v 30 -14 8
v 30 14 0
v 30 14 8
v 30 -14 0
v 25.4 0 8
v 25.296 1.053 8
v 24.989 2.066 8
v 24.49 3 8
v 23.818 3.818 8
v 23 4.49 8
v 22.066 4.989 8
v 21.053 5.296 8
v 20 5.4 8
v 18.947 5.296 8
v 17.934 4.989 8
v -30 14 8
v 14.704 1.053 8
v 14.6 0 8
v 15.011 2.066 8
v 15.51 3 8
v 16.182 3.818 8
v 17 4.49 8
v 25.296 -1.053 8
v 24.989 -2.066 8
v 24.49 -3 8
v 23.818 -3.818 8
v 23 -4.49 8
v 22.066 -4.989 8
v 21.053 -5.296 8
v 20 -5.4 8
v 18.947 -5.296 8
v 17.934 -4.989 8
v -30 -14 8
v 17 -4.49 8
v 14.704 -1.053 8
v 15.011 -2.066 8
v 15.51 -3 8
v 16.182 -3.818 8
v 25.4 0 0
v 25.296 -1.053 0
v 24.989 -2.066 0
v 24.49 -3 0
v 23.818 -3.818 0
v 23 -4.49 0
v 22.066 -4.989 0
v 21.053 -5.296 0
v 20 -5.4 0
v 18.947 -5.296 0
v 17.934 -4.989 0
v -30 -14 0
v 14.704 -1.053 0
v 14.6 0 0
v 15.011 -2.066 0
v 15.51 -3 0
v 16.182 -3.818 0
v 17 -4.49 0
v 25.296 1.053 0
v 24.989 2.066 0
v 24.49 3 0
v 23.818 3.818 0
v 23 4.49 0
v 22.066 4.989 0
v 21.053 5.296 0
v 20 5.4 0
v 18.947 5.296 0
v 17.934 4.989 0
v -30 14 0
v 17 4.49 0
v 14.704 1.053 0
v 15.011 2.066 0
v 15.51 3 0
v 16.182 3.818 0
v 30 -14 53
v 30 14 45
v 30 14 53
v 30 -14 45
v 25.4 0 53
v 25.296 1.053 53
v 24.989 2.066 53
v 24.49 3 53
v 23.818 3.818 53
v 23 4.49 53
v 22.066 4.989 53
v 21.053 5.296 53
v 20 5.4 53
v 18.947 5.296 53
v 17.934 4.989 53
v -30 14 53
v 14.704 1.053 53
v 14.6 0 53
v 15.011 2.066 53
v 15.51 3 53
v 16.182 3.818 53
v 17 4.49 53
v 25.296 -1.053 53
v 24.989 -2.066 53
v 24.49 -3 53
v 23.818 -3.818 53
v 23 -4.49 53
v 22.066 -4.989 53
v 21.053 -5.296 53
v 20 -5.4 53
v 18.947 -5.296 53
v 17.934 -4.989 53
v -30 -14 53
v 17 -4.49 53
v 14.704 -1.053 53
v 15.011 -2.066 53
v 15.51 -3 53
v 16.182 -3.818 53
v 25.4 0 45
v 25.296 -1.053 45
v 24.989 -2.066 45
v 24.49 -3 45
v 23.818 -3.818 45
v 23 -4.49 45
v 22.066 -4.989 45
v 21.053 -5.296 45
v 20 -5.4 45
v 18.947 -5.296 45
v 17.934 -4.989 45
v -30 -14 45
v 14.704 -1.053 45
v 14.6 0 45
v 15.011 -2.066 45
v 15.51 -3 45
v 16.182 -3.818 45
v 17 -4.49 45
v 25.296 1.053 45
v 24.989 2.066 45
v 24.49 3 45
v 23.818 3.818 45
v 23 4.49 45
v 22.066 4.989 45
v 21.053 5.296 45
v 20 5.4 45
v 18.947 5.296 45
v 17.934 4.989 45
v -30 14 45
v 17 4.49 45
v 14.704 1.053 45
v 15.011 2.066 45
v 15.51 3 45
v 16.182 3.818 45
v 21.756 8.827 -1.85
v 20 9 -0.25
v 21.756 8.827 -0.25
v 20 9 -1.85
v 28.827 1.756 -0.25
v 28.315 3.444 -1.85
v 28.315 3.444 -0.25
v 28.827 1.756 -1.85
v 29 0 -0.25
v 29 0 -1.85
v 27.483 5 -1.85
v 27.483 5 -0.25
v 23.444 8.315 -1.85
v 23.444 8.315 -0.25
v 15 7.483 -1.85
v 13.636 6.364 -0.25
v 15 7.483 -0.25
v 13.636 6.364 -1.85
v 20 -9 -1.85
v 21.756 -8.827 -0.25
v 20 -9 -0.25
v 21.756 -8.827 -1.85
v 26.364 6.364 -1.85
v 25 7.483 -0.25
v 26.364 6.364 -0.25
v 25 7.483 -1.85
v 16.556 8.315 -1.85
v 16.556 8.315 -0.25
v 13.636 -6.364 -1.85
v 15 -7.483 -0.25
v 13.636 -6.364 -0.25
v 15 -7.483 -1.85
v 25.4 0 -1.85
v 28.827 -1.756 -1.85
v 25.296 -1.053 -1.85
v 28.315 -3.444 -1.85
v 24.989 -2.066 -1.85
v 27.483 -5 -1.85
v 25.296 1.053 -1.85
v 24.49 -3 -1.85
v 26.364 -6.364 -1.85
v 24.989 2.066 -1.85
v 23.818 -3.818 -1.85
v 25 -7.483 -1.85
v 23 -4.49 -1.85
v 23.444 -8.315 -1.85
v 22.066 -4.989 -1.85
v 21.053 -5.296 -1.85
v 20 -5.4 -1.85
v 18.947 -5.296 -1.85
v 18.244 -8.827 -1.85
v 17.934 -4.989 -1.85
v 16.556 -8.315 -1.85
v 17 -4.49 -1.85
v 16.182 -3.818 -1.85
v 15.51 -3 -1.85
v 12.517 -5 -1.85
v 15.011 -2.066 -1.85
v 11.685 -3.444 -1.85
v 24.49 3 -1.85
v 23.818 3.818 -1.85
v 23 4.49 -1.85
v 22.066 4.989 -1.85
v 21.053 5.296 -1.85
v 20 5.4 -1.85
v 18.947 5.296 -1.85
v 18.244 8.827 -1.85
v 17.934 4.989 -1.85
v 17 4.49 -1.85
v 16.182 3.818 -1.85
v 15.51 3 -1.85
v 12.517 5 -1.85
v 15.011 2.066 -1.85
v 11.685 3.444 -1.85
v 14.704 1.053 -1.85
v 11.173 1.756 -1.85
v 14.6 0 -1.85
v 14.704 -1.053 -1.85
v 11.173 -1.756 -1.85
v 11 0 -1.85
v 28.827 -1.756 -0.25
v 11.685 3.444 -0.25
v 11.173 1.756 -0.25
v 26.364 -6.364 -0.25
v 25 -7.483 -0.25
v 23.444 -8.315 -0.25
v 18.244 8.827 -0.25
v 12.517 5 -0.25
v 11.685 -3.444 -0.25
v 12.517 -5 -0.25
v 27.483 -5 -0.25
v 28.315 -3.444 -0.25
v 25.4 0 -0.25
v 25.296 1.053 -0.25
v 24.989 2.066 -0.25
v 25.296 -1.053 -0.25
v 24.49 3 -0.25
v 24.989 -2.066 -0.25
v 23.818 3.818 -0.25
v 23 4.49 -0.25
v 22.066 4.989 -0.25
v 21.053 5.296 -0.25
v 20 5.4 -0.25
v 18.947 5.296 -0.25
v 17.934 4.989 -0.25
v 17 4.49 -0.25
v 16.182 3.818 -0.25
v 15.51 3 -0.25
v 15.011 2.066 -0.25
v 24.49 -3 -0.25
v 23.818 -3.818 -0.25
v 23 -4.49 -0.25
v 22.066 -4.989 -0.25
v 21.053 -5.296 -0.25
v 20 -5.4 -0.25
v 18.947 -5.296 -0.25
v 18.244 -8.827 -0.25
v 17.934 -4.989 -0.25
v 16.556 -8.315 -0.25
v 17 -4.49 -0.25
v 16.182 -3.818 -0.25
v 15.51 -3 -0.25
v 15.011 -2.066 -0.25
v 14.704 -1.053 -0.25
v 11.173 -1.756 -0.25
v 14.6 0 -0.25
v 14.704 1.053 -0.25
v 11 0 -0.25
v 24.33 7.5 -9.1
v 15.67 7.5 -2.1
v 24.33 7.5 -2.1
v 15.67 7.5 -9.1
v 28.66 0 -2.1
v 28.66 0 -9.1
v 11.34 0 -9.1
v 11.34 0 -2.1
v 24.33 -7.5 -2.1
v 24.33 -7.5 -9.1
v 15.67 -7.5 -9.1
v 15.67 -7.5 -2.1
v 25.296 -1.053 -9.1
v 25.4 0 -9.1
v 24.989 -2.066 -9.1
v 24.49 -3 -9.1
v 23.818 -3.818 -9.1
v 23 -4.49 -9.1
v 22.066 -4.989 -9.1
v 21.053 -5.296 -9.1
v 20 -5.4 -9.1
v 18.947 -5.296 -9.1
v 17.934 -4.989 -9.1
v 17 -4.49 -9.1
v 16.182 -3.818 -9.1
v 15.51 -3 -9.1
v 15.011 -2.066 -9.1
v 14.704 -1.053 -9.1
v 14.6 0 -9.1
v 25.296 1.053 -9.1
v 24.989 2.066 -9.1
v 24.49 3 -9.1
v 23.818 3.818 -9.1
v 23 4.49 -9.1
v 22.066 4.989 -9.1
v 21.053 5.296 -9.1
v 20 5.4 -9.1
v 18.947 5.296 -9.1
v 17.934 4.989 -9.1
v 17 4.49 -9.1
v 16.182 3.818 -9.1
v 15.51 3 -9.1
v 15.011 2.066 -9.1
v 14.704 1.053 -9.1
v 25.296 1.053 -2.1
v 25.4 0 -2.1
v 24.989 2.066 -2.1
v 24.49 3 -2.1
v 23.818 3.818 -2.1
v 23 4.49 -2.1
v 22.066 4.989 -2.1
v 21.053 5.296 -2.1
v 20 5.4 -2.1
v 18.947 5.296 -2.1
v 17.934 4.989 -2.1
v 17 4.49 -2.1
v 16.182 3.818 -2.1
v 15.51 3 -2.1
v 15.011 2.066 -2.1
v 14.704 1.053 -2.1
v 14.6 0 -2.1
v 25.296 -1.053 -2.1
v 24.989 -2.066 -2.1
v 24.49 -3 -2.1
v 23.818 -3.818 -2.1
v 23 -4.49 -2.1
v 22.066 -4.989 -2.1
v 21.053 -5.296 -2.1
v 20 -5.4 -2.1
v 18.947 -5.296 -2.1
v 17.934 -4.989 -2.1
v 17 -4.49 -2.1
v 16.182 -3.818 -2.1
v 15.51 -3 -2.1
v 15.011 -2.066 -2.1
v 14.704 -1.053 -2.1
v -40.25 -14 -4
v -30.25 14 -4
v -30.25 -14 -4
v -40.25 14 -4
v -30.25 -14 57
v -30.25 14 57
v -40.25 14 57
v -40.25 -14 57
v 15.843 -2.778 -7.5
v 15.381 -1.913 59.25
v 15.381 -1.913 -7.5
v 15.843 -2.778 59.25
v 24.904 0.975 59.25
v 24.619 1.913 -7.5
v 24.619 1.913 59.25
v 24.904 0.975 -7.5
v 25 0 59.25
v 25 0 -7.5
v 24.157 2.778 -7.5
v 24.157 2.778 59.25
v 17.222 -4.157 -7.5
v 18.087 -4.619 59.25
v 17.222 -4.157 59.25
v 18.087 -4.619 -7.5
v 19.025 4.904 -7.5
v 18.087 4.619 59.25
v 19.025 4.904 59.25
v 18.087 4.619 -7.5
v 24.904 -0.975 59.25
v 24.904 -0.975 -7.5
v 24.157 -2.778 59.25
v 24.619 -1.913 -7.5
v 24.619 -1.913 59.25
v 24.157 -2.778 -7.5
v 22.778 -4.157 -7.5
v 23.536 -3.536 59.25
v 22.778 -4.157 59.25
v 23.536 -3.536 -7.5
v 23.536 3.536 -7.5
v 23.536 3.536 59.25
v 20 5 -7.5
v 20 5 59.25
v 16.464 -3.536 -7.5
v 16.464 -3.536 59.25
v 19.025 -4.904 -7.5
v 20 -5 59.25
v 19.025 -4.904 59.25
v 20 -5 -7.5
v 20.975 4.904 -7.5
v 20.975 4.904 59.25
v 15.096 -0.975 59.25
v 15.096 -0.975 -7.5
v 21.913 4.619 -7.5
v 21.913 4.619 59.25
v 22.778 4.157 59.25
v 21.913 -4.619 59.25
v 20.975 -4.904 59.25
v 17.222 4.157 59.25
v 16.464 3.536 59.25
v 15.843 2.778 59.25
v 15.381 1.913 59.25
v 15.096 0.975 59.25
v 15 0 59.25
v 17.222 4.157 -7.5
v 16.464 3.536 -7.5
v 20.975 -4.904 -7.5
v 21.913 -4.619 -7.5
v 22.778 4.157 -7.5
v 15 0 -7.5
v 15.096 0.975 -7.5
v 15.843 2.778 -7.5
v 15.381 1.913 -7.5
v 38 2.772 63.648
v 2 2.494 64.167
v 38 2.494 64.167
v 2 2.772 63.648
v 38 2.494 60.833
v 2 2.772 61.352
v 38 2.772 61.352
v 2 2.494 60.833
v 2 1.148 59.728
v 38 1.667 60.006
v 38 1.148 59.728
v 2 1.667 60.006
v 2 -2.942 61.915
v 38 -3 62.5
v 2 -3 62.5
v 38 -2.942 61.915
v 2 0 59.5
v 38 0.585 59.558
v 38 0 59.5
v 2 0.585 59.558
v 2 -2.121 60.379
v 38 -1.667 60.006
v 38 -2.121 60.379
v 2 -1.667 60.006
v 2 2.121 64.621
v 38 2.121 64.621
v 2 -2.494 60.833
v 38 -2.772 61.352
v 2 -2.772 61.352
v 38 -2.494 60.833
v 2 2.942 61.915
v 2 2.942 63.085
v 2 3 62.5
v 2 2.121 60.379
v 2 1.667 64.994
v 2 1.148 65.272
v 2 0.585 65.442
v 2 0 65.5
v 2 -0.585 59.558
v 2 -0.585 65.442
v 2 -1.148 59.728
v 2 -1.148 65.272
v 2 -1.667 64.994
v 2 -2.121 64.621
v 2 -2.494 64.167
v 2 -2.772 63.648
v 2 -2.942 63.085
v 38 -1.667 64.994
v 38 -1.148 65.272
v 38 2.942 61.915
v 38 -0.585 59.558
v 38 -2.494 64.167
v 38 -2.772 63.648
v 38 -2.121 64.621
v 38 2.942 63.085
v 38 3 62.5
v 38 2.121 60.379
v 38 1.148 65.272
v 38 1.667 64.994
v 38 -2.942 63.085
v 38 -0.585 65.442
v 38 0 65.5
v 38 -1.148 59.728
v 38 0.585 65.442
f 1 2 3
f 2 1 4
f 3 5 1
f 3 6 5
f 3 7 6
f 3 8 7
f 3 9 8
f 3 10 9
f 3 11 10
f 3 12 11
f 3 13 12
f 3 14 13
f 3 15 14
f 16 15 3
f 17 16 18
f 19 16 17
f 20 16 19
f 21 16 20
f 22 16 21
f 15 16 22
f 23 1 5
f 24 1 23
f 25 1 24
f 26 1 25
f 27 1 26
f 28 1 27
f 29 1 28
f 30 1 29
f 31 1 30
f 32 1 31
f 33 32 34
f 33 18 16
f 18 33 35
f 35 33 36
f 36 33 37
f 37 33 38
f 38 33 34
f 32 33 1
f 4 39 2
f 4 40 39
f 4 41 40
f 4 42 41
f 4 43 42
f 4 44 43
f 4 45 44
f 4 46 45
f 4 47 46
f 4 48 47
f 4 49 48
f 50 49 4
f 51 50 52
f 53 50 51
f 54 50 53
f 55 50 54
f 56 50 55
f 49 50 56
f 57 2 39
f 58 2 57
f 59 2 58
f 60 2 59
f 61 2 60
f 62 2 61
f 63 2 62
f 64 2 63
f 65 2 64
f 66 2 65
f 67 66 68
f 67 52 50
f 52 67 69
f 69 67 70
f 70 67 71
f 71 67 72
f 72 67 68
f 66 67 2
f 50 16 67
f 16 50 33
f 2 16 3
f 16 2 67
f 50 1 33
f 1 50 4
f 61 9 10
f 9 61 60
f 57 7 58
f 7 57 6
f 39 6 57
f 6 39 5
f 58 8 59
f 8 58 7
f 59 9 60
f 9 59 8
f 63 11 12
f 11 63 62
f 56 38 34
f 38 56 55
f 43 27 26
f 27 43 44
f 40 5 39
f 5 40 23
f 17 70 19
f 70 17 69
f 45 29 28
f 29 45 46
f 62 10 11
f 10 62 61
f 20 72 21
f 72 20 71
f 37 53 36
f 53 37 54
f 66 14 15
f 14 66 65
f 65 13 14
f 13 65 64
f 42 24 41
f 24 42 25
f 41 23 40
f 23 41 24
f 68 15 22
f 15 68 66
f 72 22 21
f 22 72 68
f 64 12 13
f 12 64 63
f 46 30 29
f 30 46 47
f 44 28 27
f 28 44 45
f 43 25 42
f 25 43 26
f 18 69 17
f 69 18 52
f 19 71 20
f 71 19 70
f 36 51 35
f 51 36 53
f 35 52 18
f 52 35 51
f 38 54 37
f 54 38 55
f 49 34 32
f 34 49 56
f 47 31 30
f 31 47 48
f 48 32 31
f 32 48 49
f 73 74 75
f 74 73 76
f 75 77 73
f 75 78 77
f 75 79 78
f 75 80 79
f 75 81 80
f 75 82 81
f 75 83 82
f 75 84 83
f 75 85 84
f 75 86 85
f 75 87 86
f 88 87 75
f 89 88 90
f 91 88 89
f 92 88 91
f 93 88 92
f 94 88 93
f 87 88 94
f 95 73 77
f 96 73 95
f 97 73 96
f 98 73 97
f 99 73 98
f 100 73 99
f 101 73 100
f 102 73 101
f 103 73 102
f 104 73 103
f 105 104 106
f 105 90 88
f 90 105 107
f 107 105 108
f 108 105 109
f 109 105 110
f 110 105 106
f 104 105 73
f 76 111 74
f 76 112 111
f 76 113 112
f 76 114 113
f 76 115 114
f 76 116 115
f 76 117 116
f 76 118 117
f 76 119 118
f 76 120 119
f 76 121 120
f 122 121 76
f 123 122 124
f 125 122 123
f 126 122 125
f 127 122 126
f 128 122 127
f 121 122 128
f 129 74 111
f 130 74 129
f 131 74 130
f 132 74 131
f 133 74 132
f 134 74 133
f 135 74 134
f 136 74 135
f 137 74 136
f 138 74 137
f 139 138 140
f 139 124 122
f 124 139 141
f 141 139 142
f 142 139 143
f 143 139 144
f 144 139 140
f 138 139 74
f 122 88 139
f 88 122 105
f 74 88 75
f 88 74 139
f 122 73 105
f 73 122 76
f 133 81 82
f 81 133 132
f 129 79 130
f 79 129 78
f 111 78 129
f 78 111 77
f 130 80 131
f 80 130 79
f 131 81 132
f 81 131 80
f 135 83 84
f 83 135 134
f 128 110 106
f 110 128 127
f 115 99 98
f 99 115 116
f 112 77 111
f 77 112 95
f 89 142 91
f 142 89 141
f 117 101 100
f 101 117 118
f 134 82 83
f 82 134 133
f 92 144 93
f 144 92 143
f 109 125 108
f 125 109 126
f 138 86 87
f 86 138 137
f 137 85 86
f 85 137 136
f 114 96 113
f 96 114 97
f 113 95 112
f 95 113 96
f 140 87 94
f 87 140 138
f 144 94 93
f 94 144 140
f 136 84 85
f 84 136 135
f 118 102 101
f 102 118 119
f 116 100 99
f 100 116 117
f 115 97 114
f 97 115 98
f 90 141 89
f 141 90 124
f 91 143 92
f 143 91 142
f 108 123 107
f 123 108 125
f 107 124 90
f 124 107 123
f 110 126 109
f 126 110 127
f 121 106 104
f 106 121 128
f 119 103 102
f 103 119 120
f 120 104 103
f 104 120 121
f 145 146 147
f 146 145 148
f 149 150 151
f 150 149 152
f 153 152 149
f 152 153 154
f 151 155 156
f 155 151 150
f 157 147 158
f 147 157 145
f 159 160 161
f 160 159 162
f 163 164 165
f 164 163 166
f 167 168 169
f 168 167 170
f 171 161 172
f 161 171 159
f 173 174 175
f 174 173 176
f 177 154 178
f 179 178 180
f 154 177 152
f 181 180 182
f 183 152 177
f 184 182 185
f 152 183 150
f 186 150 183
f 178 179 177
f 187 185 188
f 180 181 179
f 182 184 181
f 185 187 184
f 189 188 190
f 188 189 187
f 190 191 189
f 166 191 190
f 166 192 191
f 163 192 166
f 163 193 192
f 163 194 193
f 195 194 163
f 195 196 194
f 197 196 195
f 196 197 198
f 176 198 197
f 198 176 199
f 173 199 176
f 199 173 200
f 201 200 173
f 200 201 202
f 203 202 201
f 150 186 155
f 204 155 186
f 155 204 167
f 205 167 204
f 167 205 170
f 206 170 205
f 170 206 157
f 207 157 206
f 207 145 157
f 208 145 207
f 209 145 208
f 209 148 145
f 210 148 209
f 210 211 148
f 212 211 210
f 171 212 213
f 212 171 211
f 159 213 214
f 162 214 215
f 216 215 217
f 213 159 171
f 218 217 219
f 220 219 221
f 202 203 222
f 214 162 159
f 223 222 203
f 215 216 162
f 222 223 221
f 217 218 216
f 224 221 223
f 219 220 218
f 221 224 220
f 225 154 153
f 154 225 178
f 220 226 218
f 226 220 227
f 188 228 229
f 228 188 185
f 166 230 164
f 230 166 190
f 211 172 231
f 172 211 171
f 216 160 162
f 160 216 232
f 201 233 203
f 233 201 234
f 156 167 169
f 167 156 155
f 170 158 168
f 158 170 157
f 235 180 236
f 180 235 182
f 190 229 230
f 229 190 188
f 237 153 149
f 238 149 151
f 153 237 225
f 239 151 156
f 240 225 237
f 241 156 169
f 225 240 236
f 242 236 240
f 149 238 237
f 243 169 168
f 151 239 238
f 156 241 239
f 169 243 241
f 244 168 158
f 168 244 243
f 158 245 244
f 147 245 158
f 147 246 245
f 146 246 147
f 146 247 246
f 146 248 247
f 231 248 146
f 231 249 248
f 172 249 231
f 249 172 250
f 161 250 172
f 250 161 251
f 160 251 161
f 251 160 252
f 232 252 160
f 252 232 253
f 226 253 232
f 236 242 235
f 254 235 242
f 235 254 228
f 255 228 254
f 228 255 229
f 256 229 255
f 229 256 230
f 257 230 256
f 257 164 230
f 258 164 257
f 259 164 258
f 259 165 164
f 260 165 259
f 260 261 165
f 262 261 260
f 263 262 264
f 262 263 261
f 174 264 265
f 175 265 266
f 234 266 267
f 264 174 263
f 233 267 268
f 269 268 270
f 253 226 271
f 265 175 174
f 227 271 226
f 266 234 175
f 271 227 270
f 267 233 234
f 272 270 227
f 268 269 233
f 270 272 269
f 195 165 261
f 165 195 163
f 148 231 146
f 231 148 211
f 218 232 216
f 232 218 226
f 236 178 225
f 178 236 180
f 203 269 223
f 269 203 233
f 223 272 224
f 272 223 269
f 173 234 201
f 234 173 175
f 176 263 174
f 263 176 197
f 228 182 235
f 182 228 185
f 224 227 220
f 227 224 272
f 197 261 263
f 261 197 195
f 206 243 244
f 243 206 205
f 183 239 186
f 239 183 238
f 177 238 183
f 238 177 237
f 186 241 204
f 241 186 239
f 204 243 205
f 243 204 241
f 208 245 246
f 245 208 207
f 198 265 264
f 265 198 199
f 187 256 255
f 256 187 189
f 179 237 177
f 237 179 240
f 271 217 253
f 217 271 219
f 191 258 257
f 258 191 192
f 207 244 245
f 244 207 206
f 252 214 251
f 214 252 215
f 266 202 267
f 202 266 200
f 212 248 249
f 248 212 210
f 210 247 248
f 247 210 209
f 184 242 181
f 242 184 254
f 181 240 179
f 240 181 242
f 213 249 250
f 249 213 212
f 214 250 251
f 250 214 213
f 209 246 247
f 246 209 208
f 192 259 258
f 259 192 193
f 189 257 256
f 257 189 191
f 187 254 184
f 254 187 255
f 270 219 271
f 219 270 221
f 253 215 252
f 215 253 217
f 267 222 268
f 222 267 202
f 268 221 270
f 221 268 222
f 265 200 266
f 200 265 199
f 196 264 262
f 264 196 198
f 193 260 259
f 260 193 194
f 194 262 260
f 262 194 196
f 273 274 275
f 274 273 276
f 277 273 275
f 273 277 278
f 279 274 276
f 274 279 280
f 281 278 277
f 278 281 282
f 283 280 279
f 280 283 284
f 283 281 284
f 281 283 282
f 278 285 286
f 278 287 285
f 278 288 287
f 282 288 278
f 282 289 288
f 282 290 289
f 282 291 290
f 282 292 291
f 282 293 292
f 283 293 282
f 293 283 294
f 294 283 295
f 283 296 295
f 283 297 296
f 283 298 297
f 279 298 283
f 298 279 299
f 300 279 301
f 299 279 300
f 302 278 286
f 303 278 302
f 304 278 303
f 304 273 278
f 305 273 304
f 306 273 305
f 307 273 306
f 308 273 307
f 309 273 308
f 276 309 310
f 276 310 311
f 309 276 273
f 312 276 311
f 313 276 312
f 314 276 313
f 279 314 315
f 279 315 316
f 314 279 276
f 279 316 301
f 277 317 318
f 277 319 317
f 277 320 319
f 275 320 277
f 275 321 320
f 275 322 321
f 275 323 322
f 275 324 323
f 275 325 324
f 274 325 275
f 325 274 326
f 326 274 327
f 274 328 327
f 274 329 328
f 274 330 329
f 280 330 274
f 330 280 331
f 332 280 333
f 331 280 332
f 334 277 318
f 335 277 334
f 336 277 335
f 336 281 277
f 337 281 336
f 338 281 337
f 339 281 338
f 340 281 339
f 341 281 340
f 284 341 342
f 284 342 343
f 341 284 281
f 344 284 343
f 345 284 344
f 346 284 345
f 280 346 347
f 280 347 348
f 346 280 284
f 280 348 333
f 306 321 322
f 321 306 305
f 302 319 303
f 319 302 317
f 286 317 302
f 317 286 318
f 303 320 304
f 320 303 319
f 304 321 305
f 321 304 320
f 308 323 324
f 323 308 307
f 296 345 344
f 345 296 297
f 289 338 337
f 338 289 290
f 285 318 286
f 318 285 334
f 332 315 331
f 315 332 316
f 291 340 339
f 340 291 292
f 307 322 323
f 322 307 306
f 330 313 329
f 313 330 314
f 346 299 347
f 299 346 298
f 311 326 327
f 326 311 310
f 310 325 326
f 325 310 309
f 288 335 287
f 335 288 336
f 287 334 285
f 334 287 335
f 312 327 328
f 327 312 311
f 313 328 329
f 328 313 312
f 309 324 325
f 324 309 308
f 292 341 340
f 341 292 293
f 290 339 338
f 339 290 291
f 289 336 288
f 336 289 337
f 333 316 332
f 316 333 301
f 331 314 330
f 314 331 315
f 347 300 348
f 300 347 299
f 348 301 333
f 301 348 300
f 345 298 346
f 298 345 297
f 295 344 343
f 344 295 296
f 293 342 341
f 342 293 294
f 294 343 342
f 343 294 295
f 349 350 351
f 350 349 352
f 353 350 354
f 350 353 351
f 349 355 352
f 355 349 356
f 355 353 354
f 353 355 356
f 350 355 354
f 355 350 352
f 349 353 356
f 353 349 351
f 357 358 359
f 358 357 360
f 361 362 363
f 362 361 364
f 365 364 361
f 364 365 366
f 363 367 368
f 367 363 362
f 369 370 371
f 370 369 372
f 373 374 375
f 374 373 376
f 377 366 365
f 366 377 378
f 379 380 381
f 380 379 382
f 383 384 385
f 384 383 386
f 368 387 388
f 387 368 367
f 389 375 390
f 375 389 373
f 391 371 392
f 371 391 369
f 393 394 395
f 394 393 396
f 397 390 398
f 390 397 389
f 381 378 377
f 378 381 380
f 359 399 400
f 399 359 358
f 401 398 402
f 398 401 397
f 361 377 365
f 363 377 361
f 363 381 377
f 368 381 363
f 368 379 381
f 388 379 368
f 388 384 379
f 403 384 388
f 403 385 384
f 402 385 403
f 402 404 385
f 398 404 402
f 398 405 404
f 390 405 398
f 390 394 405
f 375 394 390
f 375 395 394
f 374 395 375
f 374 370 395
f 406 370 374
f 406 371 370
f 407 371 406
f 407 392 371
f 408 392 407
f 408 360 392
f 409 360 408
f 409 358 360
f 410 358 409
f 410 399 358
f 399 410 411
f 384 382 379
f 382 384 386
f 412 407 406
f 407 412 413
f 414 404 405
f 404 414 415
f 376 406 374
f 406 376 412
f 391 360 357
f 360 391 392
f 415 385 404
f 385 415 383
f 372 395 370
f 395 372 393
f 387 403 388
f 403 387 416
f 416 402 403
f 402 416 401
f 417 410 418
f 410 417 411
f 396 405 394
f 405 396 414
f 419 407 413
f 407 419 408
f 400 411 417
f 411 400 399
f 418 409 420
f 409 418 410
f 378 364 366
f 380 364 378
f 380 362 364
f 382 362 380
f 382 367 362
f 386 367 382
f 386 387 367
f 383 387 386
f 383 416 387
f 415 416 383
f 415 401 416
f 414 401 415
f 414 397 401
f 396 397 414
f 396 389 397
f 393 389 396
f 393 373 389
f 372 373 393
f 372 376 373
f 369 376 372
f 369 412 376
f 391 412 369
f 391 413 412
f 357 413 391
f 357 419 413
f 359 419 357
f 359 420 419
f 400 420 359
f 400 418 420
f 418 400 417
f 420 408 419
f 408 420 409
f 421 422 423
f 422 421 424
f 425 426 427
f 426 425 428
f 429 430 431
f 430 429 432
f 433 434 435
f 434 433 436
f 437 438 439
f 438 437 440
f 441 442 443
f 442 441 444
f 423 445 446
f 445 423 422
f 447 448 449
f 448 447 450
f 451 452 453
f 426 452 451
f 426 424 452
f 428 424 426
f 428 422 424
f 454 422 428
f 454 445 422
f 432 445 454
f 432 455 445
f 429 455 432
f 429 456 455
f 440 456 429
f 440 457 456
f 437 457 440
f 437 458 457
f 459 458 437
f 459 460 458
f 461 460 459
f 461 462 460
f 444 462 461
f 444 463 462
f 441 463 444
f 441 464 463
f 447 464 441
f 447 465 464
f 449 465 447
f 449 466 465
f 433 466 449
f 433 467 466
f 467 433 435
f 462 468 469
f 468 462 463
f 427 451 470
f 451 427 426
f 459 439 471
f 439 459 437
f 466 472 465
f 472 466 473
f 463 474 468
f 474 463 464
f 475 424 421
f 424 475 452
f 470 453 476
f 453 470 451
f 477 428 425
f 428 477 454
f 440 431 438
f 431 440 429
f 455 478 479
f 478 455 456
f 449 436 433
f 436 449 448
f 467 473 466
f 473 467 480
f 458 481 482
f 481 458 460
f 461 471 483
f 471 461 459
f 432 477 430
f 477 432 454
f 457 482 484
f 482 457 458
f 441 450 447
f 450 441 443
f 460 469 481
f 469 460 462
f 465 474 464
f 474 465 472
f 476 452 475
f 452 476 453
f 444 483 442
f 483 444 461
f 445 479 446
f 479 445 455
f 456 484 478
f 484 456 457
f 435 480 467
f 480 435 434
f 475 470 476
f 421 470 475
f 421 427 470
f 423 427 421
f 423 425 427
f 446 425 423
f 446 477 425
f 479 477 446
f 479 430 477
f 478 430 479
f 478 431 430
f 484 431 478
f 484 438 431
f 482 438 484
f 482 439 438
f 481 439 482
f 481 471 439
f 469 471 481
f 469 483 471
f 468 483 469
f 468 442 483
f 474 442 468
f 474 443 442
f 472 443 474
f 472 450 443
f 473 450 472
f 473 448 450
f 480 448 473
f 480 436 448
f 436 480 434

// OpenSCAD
$fn = 32;

// ------------------------------------------------------------------------
// C clamp: throat 45 mm, screw d10
// Every part is its own module, assembly() places every instance.
// ------------------------------------------------------------------------

// --- part 1 ---
module clamp_arm() {
  difference() {
    translate([-30, -14, 0]) cube([60, 28, 8]);
    translate([20, 0, -1]) cylinder(h = 10, d = 10.8);
  }
}

// --- part 2 ---
module clamp_spine() {
  difference() {
    translate([-30.5, -14, 0]) cube([61, 28, 10]);
  }
}

// --- part 3 ---
module clamp_screw() {
  translate([0, 0, -33.375]) cylinder(h = 66.75, d = 10);
}

// --- part 4 ---
module clamp_washer() {
  difference() {
      translate([0, 0, 0]) cylinder(h = 1.6, d = 18);
      translate([0, 0, -1]) cylinder(h = 3.6, d = 10.8);
    }
}

// --- part 5 ---
module clamp_nut() {
  difference() {
    linear_extrude(height = 7) polygon(points = [[8.66, 0], [4.33, 7.5], [-4.33, 7.5], [-8.66, 0], [-4.33, -7.5], [4.33, -7.5]]);
    translate([0, 0, -1]) cylinder(h = 9, d = 10.8);
  }
}

// --- part 6 ---
module tommy_bar() {
  translate([0, 0, -18]) cylinder(h = 36, d = 6);
}

// --- assembly ---
module assembly() {
  color([0.80, 0.24, 0.20]) translate([0, 0, 0]) rotate([0, 0, 0]) clamp_arm();
  color([0.20, 0.45, 0.75]) translate([0, 0, 45]) rotate([0, 0, 0]) clamp_arm();
  color([0.25, 0.62, 0.32]) translate([-40.25, 0, 26.5]) rotate([0, 90, 0]) clamp_spine();
  color([0.92, 0.70, 0.18]) translate([20, 0, 25.875]) rotate([0, 0, 0]) clamp_screw();
  color([0.58, 0.35, 0.70]) translate([20, 0, -1.85]) rotate([0, 0, 0]) clamp_washer();
  color([0.16, 0.66, 0.66]) translate([20, 0, -9.1]) rotate([0, 0, 0]) clamp_nut();
  color([0.85, 0.48, 0.18]) translate([20, 0, 62.5]) rotate([0, 90, 0]) tommy_bar();
}

assembly();
